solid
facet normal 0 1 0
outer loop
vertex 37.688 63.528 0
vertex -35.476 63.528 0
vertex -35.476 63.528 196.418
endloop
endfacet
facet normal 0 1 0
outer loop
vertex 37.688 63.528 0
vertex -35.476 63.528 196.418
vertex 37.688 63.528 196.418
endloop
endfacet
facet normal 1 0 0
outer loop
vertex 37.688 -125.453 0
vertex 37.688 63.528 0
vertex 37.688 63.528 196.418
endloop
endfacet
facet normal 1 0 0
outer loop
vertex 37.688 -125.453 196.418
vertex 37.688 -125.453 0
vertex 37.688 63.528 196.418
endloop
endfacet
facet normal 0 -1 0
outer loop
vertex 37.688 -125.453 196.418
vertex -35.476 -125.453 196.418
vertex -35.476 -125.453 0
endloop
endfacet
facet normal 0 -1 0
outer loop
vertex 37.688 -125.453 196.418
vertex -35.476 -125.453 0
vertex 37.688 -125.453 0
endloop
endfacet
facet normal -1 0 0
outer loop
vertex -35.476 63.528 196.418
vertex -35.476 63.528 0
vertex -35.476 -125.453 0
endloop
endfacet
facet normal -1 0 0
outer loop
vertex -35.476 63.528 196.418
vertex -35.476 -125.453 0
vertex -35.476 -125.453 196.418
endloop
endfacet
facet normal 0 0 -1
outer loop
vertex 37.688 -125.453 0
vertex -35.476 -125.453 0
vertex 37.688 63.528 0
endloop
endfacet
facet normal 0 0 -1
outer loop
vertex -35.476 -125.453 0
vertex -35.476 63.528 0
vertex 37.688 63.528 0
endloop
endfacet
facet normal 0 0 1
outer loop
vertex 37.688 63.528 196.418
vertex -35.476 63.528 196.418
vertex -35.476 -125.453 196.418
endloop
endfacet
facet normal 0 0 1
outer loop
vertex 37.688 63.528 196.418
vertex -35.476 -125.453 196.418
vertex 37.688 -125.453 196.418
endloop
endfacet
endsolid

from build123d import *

# Parameters (mm, degrees)
F0_W      = 73.164038
F0_H      = 72.853908
F1_DEPTH  = 196.417706
F1_FACE_W = 73.164038
F1_FACE_H = 196.417706
F2_DEPTH  = 116.126517
F3_W      = 35.476319
F3_H      = 25.545895
F4_DEPTH  = 137.581224


with BuildPart() as f1:
    # F0 (on Top) → F1 (new body)
    with BuildSketch(Plane.XY):
        with Locations((1.1057, 27.100936)):
            Rectangle(F0_W, F0_H)
    extrude(amount=F1_DEPTH)

    # F1_face (on face) → F2 (join)
    with BuildSketch(Plane(origin=(1.1057, -9.326018, 98.208853), x_dir=(1, 0, 0), z_dir=(0, -1, 0))):
        Rectangle(F1_FACE_W, F1_FACE_H)
    extrude(amount=F2_DEPTH)

    # F3 (on face) → F4 (join)
    with BuildSketch(Plane.XY.offset(196.417706)):
        with Locations((-17.738159, 12.772947)):
            Rectangle(F3_W, F3_H)
        Polygon((0, 25.545895), (0, 0), (-35.476319, 0), (-35.476319, -125.452535), (37.687719, -125.452535), (37.687719, 63.52789), (-35.476319, 63.52789), (-35.476319, 25.545895), align=None)
    extrude(amount=-F4_DEPTH)


solid = f1.part
